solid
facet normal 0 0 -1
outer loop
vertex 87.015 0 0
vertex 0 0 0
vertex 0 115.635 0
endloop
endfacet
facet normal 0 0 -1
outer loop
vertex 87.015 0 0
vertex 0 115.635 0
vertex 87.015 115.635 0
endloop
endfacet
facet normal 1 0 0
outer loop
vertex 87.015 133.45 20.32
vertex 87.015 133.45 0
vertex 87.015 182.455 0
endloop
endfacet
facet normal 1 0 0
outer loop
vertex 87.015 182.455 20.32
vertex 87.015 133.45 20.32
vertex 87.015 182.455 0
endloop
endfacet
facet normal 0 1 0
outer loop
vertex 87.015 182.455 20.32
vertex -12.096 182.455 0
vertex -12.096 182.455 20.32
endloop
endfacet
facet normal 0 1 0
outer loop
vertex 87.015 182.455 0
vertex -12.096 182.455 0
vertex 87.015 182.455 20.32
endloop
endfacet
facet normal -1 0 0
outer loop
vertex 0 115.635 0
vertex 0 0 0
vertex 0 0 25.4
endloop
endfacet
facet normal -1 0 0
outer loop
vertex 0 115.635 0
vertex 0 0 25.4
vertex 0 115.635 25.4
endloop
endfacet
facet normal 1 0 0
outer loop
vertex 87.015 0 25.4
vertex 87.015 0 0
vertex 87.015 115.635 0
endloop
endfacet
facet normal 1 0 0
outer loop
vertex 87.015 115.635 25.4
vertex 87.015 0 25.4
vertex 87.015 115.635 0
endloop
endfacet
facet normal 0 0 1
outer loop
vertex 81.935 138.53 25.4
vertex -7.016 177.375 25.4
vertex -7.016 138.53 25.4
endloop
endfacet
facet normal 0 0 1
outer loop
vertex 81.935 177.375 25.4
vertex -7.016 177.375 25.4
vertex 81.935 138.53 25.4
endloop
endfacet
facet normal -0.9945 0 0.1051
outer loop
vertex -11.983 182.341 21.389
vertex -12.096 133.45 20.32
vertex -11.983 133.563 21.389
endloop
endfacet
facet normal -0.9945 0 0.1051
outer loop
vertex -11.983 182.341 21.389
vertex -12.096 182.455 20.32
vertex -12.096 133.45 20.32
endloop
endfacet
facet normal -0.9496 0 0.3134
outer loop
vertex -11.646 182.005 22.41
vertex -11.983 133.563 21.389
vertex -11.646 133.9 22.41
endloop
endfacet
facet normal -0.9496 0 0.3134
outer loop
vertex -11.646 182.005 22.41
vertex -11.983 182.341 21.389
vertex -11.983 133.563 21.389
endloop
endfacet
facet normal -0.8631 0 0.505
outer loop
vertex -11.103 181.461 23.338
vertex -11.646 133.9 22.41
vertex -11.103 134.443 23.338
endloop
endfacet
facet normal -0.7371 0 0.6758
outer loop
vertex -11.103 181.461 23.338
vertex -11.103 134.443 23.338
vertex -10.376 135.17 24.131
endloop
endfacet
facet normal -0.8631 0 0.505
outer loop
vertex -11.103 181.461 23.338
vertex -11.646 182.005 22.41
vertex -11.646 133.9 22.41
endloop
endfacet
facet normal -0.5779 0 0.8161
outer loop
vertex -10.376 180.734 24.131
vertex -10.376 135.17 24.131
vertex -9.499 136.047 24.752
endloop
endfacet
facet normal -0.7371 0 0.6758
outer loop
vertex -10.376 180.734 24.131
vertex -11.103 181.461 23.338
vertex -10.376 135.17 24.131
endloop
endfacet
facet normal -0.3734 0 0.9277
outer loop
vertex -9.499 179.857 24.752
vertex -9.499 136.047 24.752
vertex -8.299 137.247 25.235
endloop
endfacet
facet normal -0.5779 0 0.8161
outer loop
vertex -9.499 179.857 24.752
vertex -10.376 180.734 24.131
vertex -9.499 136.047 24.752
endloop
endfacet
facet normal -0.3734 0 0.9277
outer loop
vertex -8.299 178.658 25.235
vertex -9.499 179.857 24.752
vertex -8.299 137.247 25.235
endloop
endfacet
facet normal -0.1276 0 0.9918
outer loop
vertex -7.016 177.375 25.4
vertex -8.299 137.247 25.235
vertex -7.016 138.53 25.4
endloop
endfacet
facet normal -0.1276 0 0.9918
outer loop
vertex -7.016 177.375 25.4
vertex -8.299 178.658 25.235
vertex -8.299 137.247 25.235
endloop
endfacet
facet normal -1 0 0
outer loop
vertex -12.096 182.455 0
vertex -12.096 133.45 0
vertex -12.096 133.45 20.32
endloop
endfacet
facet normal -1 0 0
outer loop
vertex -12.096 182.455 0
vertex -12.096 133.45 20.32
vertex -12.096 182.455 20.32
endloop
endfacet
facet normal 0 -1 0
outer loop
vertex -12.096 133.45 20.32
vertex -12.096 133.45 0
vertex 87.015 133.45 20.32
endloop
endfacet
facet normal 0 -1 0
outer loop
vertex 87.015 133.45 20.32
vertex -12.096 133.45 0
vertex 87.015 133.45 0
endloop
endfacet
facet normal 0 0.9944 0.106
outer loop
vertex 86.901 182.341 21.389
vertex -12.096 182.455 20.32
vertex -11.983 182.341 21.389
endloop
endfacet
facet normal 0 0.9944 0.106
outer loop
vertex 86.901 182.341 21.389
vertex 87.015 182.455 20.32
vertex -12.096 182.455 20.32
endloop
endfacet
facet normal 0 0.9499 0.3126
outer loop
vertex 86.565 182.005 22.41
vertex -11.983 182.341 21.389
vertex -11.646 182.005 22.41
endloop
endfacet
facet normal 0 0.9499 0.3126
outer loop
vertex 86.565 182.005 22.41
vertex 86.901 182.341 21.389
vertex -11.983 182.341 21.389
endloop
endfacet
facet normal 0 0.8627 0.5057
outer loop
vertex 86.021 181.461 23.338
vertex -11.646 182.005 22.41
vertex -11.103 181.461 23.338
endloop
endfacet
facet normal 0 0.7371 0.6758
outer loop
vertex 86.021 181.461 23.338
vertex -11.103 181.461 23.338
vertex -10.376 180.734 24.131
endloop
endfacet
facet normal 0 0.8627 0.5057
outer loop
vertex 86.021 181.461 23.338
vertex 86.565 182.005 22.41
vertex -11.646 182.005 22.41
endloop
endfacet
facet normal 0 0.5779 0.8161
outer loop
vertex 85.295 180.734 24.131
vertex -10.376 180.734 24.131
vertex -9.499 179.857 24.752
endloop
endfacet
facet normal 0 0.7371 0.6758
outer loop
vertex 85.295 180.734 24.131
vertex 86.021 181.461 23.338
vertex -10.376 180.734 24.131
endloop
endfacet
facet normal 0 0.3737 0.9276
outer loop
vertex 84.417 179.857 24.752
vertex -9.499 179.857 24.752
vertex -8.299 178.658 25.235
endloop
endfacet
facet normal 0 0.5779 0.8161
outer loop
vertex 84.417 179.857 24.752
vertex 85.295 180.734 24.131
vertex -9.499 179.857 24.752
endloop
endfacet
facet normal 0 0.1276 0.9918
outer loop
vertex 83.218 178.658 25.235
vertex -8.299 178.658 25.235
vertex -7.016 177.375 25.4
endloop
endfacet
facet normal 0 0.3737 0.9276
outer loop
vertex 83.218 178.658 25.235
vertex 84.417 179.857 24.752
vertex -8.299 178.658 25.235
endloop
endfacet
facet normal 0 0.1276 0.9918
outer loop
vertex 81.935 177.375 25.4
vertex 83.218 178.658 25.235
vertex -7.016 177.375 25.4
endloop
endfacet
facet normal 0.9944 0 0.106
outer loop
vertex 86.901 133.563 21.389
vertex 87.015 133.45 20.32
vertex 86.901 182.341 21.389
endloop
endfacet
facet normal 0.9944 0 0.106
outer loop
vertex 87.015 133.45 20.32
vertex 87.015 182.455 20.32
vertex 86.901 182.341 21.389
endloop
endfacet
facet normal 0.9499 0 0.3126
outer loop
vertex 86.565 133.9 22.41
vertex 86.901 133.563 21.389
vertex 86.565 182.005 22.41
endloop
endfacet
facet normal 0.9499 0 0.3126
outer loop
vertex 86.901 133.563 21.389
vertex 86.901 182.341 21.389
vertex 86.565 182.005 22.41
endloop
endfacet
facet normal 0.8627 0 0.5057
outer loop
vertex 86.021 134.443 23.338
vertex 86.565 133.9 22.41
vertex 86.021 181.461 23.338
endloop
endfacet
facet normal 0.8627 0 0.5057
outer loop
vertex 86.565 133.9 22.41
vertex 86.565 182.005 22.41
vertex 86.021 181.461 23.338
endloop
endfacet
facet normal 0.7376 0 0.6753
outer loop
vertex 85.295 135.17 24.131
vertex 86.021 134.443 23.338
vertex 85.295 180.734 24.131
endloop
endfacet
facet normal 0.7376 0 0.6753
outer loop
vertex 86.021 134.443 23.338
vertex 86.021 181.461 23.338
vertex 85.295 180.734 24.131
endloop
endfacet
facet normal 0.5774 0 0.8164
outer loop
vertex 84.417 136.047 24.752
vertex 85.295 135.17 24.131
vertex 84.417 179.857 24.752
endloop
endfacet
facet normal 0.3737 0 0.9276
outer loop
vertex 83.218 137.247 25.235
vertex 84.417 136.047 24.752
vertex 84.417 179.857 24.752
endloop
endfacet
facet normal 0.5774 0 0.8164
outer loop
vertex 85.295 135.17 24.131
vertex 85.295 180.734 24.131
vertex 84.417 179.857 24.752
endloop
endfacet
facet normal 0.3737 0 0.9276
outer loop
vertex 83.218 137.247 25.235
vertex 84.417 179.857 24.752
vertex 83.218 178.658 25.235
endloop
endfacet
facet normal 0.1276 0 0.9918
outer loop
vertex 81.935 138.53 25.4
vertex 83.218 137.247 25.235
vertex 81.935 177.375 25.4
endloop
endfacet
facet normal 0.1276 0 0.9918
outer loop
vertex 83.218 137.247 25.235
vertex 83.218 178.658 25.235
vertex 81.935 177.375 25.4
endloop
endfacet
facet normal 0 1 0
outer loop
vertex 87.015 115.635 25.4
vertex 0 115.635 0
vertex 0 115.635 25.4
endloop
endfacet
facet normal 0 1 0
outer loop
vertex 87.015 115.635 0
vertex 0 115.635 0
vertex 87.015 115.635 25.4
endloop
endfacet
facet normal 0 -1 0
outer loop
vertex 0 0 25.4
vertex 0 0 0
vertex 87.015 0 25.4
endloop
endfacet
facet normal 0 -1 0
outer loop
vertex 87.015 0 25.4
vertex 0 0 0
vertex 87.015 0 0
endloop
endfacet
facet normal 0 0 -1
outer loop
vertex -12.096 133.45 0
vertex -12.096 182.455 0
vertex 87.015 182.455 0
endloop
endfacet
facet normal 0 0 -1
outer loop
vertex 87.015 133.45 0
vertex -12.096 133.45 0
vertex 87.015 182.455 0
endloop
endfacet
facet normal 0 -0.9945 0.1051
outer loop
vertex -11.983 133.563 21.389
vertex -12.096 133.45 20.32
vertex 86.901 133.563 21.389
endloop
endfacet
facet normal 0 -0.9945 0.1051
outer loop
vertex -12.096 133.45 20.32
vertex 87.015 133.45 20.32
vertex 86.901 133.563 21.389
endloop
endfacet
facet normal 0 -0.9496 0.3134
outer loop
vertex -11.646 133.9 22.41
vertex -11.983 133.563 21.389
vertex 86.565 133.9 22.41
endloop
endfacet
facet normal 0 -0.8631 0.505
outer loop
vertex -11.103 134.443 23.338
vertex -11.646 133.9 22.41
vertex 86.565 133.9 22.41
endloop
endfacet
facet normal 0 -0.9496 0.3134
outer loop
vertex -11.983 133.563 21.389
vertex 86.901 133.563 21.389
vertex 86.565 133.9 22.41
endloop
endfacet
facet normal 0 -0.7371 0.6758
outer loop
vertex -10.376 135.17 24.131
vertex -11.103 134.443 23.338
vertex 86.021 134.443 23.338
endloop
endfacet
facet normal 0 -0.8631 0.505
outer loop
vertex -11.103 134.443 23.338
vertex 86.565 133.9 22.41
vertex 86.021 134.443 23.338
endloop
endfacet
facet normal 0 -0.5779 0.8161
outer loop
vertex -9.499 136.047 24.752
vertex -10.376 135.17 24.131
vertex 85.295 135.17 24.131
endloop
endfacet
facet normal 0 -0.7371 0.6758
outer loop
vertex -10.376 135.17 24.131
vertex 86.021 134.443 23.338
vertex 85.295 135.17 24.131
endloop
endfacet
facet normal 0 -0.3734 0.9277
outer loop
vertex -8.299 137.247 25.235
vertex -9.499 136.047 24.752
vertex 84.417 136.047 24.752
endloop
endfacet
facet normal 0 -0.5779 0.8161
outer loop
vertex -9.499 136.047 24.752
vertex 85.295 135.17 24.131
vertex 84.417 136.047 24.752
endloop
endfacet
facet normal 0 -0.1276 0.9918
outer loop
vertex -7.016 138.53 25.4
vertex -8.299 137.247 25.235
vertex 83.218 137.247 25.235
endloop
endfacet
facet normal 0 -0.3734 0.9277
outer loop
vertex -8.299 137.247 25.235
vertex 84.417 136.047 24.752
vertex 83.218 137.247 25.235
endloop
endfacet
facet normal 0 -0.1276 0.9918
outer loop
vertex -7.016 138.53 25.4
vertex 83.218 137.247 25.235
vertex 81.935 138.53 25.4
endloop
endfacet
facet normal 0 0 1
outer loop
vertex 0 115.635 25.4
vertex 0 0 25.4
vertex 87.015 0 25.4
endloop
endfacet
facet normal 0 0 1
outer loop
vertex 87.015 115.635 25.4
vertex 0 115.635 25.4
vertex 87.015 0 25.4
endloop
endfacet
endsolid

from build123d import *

# Parameters (mm, degrees)
F0_W     = 87.0151
F0_H     = 115.635
F0_W_2   = 99.111501
F0_H_2   = 49.005344
F1_DEPTH = 25.4
F2_R     = 5.08


with BuildPart() as f1:
    # F0 (on Top) → F1 (new body)
    with BuildSketch(Plane.XY):
        with Locations((43.50755, 57.8175)):
            Rectangle(F0_W, F0_H)
        with Locations((37.459349, 157.952316)):
            Rectangle(F0_W_2, F0_H_2)
    extrude(amount=F1_DEPTH)

    # F2
    f2_edges = [f1.edges().sort_by_distance(p)[0] for p in [
        (37.459349, 182.454988, 25.4),
        (-12.096401, 157.952316, 25.4),
        (37.459349, 133.449644, 25.4),
        (87.0151, 157.952316, 25.4),
    ]]
    fillet(f2_edges, radius=F2_R)


solid = f1.part
